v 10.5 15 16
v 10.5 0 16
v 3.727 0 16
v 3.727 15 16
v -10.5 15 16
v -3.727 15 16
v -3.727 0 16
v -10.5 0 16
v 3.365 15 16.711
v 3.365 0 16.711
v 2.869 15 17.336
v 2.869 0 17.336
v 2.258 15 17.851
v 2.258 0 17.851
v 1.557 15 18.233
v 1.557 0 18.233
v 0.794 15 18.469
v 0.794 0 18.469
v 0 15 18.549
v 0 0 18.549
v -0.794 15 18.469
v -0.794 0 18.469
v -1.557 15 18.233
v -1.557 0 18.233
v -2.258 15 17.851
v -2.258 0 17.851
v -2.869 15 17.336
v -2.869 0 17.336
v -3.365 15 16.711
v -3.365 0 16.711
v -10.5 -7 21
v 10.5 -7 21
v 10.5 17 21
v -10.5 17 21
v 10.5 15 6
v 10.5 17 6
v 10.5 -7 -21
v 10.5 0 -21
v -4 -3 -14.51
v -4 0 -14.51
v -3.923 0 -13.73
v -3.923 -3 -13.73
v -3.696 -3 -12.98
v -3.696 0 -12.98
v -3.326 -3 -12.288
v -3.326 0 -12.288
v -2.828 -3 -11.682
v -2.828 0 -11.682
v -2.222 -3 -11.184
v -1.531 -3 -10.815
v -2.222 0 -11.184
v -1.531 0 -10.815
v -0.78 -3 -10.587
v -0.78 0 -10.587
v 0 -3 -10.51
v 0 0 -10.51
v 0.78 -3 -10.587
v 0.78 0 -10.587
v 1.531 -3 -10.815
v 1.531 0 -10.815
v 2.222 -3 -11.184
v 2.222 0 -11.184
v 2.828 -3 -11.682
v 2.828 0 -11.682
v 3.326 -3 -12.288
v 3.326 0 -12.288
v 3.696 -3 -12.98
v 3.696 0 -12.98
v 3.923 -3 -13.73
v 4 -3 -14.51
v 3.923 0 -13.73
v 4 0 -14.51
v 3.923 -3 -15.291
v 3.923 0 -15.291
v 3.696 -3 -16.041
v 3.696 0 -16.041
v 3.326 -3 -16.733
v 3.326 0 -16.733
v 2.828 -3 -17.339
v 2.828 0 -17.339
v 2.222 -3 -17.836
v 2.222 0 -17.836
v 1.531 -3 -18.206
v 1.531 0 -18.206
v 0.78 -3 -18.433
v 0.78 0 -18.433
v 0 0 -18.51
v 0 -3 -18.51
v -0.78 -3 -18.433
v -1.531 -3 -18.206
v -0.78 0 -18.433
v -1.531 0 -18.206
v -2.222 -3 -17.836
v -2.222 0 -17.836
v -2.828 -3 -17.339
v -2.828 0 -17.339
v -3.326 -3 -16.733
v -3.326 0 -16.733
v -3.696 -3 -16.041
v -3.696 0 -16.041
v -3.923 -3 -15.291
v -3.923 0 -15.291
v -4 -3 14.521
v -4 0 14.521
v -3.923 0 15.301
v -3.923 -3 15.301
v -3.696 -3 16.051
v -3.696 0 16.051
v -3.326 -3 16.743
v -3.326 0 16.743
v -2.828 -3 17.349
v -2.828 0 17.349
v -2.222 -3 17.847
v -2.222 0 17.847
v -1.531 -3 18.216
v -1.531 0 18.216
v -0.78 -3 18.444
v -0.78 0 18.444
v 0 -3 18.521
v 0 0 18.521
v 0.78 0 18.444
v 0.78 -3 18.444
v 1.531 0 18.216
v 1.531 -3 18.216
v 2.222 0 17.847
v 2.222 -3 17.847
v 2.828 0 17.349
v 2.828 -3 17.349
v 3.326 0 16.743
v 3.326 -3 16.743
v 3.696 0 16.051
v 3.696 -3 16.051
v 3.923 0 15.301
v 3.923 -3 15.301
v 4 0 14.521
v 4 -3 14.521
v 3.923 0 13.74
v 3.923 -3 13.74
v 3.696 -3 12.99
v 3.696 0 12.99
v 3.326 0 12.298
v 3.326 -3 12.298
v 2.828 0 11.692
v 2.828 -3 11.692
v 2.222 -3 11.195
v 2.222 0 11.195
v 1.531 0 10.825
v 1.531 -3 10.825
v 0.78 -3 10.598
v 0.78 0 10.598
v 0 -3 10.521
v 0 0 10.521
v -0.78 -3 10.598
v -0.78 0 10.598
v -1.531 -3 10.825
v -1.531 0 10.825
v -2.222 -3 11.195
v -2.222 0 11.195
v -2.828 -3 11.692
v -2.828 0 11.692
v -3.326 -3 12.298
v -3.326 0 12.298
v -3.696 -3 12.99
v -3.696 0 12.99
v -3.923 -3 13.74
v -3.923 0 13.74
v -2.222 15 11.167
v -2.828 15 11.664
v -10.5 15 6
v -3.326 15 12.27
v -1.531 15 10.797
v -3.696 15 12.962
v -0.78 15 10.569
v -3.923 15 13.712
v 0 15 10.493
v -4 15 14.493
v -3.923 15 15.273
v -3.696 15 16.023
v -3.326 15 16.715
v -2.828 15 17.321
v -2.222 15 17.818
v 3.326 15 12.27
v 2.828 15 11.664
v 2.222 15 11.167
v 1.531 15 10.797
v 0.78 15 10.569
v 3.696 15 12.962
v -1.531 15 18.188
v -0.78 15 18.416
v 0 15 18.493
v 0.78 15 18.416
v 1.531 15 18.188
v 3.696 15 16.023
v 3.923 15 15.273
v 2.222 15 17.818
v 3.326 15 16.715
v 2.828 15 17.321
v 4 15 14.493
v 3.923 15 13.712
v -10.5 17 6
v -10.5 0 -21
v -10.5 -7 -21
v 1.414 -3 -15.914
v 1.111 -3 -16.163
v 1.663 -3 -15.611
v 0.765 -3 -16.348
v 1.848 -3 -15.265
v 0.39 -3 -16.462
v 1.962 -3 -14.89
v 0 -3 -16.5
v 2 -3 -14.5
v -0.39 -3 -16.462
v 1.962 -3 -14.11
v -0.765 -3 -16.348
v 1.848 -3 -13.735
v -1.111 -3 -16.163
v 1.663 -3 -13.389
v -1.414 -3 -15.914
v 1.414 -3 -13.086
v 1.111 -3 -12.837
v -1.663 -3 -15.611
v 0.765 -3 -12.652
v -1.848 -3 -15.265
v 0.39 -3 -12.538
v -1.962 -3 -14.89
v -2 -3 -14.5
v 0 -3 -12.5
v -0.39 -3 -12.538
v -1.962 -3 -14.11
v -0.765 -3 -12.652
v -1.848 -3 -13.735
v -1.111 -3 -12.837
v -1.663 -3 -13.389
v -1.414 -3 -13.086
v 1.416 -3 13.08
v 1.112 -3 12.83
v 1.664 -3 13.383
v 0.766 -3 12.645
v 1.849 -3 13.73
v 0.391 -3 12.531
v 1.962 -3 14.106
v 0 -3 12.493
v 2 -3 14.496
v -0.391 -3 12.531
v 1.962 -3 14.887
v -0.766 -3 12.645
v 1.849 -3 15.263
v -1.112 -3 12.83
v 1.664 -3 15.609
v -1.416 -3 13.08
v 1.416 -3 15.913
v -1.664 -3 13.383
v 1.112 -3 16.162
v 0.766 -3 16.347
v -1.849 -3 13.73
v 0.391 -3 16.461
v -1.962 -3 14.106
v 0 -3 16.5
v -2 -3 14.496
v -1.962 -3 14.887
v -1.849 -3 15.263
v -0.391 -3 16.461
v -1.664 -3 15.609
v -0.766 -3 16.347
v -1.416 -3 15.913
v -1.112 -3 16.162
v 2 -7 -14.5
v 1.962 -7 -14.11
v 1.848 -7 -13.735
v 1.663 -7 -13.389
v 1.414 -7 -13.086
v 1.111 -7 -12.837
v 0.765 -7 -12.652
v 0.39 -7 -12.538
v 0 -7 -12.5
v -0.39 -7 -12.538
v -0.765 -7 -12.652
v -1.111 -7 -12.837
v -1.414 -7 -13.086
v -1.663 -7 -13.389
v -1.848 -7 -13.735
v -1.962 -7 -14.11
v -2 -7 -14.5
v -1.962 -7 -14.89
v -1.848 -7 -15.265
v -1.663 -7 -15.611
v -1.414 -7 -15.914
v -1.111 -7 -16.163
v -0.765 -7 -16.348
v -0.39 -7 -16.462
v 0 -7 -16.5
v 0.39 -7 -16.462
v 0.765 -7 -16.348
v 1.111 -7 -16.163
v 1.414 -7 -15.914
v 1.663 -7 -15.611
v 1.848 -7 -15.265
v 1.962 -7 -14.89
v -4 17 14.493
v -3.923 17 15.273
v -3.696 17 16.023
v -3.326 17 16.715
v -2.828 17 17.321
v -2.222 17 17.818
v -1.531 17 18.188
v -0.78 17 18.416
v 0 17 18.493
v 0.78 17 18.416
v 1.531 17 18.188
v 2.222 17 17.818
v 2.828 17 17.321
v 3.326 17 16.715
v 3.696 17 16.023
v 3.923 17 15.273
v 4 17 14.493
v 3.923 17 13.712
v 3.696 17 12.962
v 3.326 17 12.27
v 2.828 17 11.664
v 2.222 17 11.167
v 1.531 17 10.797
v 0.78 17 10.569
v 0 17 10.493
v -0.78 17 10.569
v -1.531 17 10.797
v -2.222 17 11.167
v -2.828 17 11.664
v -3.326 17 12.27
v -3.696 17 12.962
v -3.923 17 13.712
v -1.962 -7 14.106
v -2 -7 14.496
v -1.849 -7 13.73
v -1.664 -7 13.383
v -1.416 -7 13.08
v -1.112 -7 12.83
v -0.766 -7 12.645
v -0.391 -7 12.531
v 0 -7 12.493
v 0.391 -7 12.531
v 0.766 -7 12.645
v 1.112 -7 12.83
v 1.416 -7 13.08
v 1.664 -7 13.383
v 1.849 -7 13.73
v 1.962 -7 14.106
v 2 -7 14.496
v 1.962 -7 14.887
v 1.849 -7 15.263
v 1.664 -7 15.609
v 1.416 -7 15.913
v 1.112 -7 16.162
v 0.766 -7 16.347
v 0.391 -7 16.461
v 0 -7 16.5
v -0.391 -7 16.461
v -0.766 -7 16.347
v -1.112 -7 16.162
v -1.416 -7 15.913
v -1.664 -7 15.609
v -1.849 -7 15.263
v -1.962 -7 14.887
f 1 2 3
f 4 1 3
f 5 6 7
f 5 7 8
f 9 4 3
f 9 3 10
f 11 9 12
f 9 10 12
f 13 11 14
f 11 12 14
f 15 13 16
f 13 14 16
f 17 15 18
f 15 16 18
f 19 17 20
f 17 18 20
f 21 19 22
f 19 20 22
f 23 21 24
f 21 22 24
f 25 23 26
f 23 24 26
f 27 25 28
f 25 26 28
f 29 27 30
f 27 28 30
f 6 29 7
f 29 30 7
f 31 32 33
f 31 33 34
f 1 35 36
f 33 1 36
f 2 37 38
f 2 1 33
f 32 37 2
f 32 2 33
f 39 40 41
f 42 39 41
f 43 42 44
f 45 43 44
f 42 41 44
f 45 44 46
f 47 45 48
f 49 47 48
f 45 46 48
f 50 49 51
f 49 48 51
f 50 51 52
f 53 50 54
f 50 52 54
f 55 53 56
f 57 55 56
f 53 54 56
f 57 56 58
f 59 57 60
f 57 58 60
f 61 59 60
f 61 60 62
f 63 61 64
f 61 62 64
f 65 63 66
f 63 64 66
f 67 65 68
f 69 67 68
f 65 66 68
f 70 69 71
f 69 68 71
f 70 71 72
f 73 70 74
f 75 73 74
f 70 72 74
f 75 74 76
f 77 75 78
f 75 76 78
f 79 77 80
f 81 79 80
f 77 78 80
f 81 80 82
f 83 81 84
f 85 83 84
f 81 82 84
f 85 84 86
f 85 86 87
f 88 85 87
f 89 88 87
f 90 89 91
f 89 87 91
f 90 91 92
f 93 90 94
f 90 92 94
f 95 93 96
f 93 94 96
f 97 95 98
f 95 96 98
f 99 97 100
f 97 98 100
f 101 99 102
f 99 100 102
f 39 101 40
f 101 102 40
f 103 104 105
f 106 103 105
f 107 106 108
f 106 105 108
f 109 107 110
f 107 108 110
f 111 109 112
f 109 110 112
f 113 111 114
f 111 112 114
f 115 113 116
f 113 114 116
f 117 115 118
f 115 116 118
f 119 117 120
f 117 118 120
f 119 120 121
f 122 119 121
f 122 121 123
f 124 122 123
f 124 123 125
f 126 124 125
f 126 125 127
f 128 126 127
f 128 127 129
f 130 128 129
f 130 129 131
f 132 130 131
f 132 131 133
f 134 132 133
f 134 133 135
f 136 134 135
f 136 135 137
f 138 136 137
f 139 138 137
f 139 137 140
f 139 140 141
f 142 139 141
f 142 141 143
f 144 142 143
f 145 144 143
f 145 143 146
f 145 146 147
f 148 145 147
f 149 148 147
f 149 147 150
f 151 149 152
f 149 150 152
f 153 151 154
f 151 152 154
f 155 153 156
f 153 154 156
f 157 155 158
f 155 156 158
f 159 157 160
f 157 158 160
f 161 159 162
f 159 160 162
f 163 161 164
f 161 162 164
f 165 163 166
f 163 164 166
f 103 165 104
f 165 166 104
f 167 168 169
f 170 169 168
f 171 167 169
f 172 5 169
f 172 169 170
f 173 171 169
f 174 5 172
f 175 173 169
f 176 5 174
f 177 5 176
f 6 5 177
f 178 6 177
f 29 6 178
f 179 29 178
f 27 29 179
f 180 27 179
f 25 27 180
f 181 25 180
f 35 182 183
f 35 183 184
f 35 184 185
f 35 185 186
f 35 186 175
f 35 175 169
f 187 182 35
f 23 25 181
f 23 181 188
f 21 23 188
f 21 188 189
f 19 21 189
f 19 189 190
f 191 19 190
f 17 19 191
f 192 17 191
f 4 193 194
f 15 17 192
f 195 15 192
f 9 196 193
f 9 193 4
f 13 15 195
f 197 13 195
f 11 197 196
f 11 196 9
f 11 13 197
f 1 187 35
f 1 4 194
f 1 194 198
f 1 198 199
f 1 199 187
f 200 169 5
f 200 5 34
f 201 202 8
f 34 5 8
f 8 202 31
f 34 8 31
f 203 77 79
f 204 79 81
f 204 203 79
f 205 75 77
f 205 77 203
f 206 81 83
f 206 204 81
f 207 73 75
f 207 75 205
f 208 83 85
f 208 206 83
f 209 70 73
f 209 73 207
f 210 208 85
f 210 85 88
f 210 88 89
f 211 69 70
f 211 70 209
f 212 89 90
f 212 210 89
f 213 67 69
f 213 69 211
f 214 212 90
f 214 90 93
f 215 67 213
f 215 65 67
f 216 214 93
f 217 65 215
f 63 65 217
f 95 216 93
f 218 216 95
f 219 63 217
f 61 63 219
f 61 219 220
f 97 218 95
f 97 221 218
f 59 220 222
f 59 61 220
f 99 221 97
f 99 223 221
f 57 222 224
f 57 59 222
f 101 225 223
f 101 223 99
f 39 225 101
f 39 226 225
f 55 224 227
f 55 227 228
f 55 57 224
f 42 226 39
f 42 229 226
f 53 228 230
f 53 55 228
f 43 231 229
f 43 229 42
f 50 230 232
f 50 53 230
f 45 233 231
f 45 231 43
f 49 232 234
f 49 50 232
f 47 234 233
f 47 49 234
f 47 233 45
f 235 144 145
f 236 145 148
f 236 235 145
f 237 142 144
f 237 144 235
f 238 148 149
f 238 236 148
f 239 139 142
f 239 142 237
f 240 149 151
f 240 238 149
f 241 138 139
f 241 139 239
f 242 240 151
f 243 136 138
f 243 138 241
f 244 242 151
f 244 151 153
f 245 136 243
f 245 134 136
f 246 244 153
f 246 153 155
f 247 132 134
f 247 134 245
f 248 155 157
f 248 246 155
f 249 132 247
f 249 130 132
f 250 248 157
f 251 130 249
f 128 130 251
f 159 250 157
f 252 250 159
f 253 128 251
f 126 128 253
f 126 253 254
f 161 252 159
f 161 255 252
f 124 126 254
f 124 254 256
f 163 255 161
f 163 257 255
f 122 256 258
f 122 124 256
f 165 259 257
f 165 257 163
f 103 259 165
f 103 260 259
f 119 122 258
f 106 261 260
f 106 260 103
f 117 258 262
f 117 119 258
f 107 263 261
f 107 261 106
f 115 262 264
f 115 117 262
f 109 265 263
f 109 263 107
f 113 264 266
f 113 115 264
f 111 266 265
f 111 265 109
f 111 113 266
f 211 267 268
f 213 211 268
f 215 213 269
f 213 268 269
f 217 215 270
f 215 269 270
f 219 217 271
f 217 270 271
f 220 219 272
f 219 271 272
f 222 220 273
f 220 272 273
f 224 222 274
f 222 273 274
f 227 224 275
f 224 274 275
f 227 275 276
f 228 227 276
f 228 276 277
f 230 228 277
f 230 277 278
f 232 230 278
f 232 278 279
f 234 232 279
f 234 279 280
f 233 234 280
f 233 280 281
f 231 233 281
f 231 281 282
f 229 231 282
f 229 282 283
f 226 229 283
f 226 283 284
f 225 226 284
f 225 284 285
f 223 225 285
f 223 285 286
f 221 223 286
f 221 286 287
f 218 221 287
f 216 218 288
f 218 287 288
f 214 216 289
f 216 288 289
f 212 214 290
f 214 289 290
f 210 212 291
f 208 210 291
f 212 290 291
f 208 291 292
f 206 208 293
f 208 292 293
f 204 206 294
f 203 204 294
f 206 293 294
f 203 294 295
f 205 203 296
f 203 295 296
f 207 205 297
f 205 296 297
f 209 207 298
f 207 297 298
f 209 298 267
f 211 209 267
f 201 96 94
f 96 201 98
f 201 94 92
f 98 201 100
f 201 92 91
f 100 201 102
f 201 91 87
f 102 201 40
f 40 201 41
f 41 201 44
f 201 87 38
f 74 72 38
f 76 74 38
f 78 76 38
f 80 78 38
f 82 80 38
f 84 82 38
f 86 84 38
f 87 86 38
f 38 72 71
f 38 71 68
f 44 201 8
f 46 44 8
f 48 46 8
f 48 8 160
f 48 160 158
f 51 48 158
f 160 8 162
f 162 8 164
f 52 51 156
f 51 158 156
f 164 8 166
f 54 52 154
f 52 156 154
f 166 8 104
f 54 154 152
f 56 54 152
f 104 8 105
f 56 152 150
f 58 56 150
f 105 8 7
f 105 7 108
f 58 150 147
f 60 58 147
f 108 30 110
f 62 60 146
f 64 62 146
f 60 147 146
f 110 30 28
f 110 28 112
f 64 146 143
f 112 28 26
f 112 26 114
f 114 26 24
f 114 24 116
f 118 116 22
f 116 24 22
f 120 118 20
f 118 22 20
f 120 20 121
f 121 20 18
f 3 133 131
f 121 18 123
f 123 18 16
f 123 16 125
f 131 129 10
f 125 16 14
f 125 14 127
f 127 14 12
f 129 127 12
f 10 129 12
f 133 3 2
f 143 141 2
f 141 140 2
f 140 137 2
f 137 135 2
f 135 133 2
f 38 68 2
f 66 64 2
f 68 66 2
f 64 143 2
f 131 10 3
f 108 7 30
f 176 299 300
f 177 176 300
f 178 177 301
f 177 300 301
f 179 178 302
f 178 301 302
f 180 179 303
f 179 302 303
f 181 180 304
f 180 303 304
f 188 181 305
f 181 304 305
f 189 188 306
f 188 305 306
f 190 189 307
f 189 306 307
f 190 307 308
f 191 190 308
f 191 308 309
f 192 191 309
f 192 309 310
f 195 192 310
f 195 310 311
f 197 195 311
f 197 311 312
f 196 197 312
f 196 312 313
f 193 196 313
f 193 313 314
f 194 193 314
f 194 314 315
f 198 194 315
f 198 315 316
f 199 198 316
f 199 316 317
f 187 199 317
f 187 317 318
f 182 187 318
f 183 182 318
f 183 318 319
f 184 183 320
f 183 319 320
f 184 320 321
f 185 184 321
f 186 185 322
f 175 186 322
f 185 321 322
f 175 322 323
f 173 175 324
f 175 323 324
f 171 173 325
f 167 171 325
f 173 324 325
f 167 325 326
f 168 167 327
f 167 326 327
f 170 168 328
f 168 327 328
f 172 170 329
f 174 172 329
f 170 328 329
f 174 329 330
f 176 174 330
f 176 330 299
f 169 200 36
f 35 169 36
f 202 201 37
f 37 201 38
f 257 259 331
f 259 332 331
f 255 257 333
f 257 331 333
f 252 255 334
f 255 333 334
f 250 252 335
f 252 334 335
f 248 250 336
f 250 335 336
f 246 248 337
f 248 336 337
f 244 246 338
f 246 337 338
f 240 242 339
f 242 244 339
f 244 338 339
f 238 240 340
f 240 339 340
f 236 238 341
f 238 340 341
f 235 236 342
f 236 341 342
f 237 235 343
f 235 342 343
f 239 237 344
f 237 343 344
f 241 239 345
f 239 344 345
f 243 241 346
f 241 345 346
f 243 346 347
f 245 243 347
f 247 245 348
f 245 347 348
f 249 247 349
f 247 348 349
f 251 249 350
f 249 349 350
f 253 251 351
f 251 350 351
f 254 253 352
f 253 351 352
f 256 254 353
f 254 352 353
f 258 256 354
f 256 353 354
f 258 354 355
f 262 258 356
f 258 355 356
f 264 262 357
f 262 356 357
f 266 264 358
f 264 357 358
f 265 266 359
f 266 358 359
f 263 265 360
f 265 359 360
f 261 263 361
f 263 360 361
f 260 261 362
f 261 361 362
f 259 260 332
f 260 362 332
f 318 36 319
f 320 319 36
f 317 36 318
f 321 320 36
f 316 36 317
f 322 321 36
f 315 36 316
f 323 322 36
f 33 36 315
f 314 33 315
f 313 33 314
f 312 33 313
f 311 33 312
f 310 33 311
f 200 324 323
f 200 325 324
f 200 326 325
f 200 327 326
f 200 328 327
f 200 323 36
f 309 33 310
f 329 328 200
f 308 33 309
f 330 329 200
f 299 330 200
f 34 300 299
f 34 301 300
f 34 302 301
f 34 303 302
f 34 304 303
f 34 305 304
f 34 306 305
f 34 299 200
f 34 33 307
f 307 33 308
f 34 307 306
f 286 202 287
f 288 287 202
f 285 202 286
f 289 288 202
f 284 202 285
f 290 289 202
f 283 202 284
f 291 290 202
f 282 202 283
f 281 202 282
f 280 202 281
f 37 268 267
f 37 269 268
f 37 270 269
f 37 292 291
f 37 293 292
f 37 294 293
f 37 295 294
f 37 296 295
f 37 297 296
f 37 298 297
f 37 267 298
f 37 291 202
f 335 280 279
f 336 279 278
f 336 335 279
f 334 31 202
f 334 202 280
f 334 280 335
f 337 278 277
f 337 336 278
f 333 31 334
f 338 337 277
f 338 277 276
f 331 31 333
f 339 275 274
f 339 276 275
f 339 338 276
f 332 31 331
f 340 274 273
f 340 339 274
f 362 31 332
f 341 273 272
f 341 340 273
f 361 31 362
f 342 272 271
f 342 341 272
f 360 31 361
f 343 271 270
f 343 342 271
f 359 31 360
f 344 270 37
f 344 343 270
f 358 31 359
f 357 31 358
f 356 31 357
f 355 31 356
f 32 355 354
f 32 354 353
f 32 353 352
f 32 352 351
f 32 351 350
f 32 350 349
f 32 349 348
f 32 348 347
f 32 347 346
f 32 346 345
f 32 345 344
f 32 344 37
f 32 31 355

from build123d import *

# Parameters (mm, degrees)
F0_W      = 21
F0_H      = 42
F1_DEPTH  = 7
F2_W      = 21
F2_H      = 5
F3_DEPTH  = 17
F4_R      = 2
F5_DEPTH  = 25
F6_R      = 4
F7_DEPTH  = 3
F8_R      = 4
F9_DEPTH  = 25
F10_W     = 21
F10_H     = 2
F11_DEPTH = 15
F12_R     = 2
F13_DEPTH = 25
F14_R     = 4
F15_DEPTH = 5


with BuildPart() as f1:
    # F0 (on Front) → F1 (new body)
    with BuildSketch(Plane.XZ):
        Rectangle(F0_W, F0_H)
    extrude(amount=F1_DEPTH)

    # F2 (on face) → F3 (join)
    with BuildSketch(Plane(origin=(0, 0, 0), x_dir=(-1, 0, 0), z_dir=(0, 1, 0))):
        with Locations((0, 18.5)):
            Rectangle(F2_W, F2_H)
    extrude(amount=F3_DEPTH)

    # F4 (on face) → F5 (cut)
    with BuildSketch(Plane.XZ.offset(7)):
        with Locations((0, 14.5)):
            Circle(F4_R)
        with Locations((0, -14.5)):
            Circle(F4_R)
    extrude(amount=-F5_DEPTH, mode=Mode.SUBTRACT)

    # F6 (on face) → F7 (cut)
    with BuildSketch(Plane(origin=(0, 0, 0), x_dir=(-1, 0, 0), z_dir=(0, 1, 0))):
        with Locations((0, 14.520681)):
            Circle(F6_R)
        with Locations((0, -14.510261)):
            Circle(F6_R)
    extrude(amount=-F7_DEPTH, mode=Mode.SUBTRACT)

    # F8 (on face) → F9 (cut)
    with BuildSketch(Plane.XZ):
        with Locations((0, 14.548728)):
            Circle(F8_R)
    extrude(amount=-F9_DEPTH, mode=Mode.SUBTRACT)

    # F10 (on face) → F11 (join)
    with BuildSketch(Plane.XY.offset(21)):
        with Locations((0, 16)):
            Rectangle(F10_W, F10_H)
    extrude(amount=-F11_DEPTH)

    # F12 (on face) → F13 (cut)
    with BuildSketch(Plane.XZ.offset(7)):
        with Locations((0, 14.492556)):
            Circle(F12_R)
    extrude(amount=-F13_DEPTH, mode=Mode.SUBTRACT)

    # F14 (on face) → F15 (cut)
    with BuildSketch(Plane(origin=(0, 17, 0), x_dir=(-1, 0, 0), z_dir=(0, 1, 0))):
        with Locations((0, 14.492556)):
            Circle(F14_R)
    extrude(amount=-F15_DEPTH, mode=Mode.SUBTRACT)


solid = f1.part
